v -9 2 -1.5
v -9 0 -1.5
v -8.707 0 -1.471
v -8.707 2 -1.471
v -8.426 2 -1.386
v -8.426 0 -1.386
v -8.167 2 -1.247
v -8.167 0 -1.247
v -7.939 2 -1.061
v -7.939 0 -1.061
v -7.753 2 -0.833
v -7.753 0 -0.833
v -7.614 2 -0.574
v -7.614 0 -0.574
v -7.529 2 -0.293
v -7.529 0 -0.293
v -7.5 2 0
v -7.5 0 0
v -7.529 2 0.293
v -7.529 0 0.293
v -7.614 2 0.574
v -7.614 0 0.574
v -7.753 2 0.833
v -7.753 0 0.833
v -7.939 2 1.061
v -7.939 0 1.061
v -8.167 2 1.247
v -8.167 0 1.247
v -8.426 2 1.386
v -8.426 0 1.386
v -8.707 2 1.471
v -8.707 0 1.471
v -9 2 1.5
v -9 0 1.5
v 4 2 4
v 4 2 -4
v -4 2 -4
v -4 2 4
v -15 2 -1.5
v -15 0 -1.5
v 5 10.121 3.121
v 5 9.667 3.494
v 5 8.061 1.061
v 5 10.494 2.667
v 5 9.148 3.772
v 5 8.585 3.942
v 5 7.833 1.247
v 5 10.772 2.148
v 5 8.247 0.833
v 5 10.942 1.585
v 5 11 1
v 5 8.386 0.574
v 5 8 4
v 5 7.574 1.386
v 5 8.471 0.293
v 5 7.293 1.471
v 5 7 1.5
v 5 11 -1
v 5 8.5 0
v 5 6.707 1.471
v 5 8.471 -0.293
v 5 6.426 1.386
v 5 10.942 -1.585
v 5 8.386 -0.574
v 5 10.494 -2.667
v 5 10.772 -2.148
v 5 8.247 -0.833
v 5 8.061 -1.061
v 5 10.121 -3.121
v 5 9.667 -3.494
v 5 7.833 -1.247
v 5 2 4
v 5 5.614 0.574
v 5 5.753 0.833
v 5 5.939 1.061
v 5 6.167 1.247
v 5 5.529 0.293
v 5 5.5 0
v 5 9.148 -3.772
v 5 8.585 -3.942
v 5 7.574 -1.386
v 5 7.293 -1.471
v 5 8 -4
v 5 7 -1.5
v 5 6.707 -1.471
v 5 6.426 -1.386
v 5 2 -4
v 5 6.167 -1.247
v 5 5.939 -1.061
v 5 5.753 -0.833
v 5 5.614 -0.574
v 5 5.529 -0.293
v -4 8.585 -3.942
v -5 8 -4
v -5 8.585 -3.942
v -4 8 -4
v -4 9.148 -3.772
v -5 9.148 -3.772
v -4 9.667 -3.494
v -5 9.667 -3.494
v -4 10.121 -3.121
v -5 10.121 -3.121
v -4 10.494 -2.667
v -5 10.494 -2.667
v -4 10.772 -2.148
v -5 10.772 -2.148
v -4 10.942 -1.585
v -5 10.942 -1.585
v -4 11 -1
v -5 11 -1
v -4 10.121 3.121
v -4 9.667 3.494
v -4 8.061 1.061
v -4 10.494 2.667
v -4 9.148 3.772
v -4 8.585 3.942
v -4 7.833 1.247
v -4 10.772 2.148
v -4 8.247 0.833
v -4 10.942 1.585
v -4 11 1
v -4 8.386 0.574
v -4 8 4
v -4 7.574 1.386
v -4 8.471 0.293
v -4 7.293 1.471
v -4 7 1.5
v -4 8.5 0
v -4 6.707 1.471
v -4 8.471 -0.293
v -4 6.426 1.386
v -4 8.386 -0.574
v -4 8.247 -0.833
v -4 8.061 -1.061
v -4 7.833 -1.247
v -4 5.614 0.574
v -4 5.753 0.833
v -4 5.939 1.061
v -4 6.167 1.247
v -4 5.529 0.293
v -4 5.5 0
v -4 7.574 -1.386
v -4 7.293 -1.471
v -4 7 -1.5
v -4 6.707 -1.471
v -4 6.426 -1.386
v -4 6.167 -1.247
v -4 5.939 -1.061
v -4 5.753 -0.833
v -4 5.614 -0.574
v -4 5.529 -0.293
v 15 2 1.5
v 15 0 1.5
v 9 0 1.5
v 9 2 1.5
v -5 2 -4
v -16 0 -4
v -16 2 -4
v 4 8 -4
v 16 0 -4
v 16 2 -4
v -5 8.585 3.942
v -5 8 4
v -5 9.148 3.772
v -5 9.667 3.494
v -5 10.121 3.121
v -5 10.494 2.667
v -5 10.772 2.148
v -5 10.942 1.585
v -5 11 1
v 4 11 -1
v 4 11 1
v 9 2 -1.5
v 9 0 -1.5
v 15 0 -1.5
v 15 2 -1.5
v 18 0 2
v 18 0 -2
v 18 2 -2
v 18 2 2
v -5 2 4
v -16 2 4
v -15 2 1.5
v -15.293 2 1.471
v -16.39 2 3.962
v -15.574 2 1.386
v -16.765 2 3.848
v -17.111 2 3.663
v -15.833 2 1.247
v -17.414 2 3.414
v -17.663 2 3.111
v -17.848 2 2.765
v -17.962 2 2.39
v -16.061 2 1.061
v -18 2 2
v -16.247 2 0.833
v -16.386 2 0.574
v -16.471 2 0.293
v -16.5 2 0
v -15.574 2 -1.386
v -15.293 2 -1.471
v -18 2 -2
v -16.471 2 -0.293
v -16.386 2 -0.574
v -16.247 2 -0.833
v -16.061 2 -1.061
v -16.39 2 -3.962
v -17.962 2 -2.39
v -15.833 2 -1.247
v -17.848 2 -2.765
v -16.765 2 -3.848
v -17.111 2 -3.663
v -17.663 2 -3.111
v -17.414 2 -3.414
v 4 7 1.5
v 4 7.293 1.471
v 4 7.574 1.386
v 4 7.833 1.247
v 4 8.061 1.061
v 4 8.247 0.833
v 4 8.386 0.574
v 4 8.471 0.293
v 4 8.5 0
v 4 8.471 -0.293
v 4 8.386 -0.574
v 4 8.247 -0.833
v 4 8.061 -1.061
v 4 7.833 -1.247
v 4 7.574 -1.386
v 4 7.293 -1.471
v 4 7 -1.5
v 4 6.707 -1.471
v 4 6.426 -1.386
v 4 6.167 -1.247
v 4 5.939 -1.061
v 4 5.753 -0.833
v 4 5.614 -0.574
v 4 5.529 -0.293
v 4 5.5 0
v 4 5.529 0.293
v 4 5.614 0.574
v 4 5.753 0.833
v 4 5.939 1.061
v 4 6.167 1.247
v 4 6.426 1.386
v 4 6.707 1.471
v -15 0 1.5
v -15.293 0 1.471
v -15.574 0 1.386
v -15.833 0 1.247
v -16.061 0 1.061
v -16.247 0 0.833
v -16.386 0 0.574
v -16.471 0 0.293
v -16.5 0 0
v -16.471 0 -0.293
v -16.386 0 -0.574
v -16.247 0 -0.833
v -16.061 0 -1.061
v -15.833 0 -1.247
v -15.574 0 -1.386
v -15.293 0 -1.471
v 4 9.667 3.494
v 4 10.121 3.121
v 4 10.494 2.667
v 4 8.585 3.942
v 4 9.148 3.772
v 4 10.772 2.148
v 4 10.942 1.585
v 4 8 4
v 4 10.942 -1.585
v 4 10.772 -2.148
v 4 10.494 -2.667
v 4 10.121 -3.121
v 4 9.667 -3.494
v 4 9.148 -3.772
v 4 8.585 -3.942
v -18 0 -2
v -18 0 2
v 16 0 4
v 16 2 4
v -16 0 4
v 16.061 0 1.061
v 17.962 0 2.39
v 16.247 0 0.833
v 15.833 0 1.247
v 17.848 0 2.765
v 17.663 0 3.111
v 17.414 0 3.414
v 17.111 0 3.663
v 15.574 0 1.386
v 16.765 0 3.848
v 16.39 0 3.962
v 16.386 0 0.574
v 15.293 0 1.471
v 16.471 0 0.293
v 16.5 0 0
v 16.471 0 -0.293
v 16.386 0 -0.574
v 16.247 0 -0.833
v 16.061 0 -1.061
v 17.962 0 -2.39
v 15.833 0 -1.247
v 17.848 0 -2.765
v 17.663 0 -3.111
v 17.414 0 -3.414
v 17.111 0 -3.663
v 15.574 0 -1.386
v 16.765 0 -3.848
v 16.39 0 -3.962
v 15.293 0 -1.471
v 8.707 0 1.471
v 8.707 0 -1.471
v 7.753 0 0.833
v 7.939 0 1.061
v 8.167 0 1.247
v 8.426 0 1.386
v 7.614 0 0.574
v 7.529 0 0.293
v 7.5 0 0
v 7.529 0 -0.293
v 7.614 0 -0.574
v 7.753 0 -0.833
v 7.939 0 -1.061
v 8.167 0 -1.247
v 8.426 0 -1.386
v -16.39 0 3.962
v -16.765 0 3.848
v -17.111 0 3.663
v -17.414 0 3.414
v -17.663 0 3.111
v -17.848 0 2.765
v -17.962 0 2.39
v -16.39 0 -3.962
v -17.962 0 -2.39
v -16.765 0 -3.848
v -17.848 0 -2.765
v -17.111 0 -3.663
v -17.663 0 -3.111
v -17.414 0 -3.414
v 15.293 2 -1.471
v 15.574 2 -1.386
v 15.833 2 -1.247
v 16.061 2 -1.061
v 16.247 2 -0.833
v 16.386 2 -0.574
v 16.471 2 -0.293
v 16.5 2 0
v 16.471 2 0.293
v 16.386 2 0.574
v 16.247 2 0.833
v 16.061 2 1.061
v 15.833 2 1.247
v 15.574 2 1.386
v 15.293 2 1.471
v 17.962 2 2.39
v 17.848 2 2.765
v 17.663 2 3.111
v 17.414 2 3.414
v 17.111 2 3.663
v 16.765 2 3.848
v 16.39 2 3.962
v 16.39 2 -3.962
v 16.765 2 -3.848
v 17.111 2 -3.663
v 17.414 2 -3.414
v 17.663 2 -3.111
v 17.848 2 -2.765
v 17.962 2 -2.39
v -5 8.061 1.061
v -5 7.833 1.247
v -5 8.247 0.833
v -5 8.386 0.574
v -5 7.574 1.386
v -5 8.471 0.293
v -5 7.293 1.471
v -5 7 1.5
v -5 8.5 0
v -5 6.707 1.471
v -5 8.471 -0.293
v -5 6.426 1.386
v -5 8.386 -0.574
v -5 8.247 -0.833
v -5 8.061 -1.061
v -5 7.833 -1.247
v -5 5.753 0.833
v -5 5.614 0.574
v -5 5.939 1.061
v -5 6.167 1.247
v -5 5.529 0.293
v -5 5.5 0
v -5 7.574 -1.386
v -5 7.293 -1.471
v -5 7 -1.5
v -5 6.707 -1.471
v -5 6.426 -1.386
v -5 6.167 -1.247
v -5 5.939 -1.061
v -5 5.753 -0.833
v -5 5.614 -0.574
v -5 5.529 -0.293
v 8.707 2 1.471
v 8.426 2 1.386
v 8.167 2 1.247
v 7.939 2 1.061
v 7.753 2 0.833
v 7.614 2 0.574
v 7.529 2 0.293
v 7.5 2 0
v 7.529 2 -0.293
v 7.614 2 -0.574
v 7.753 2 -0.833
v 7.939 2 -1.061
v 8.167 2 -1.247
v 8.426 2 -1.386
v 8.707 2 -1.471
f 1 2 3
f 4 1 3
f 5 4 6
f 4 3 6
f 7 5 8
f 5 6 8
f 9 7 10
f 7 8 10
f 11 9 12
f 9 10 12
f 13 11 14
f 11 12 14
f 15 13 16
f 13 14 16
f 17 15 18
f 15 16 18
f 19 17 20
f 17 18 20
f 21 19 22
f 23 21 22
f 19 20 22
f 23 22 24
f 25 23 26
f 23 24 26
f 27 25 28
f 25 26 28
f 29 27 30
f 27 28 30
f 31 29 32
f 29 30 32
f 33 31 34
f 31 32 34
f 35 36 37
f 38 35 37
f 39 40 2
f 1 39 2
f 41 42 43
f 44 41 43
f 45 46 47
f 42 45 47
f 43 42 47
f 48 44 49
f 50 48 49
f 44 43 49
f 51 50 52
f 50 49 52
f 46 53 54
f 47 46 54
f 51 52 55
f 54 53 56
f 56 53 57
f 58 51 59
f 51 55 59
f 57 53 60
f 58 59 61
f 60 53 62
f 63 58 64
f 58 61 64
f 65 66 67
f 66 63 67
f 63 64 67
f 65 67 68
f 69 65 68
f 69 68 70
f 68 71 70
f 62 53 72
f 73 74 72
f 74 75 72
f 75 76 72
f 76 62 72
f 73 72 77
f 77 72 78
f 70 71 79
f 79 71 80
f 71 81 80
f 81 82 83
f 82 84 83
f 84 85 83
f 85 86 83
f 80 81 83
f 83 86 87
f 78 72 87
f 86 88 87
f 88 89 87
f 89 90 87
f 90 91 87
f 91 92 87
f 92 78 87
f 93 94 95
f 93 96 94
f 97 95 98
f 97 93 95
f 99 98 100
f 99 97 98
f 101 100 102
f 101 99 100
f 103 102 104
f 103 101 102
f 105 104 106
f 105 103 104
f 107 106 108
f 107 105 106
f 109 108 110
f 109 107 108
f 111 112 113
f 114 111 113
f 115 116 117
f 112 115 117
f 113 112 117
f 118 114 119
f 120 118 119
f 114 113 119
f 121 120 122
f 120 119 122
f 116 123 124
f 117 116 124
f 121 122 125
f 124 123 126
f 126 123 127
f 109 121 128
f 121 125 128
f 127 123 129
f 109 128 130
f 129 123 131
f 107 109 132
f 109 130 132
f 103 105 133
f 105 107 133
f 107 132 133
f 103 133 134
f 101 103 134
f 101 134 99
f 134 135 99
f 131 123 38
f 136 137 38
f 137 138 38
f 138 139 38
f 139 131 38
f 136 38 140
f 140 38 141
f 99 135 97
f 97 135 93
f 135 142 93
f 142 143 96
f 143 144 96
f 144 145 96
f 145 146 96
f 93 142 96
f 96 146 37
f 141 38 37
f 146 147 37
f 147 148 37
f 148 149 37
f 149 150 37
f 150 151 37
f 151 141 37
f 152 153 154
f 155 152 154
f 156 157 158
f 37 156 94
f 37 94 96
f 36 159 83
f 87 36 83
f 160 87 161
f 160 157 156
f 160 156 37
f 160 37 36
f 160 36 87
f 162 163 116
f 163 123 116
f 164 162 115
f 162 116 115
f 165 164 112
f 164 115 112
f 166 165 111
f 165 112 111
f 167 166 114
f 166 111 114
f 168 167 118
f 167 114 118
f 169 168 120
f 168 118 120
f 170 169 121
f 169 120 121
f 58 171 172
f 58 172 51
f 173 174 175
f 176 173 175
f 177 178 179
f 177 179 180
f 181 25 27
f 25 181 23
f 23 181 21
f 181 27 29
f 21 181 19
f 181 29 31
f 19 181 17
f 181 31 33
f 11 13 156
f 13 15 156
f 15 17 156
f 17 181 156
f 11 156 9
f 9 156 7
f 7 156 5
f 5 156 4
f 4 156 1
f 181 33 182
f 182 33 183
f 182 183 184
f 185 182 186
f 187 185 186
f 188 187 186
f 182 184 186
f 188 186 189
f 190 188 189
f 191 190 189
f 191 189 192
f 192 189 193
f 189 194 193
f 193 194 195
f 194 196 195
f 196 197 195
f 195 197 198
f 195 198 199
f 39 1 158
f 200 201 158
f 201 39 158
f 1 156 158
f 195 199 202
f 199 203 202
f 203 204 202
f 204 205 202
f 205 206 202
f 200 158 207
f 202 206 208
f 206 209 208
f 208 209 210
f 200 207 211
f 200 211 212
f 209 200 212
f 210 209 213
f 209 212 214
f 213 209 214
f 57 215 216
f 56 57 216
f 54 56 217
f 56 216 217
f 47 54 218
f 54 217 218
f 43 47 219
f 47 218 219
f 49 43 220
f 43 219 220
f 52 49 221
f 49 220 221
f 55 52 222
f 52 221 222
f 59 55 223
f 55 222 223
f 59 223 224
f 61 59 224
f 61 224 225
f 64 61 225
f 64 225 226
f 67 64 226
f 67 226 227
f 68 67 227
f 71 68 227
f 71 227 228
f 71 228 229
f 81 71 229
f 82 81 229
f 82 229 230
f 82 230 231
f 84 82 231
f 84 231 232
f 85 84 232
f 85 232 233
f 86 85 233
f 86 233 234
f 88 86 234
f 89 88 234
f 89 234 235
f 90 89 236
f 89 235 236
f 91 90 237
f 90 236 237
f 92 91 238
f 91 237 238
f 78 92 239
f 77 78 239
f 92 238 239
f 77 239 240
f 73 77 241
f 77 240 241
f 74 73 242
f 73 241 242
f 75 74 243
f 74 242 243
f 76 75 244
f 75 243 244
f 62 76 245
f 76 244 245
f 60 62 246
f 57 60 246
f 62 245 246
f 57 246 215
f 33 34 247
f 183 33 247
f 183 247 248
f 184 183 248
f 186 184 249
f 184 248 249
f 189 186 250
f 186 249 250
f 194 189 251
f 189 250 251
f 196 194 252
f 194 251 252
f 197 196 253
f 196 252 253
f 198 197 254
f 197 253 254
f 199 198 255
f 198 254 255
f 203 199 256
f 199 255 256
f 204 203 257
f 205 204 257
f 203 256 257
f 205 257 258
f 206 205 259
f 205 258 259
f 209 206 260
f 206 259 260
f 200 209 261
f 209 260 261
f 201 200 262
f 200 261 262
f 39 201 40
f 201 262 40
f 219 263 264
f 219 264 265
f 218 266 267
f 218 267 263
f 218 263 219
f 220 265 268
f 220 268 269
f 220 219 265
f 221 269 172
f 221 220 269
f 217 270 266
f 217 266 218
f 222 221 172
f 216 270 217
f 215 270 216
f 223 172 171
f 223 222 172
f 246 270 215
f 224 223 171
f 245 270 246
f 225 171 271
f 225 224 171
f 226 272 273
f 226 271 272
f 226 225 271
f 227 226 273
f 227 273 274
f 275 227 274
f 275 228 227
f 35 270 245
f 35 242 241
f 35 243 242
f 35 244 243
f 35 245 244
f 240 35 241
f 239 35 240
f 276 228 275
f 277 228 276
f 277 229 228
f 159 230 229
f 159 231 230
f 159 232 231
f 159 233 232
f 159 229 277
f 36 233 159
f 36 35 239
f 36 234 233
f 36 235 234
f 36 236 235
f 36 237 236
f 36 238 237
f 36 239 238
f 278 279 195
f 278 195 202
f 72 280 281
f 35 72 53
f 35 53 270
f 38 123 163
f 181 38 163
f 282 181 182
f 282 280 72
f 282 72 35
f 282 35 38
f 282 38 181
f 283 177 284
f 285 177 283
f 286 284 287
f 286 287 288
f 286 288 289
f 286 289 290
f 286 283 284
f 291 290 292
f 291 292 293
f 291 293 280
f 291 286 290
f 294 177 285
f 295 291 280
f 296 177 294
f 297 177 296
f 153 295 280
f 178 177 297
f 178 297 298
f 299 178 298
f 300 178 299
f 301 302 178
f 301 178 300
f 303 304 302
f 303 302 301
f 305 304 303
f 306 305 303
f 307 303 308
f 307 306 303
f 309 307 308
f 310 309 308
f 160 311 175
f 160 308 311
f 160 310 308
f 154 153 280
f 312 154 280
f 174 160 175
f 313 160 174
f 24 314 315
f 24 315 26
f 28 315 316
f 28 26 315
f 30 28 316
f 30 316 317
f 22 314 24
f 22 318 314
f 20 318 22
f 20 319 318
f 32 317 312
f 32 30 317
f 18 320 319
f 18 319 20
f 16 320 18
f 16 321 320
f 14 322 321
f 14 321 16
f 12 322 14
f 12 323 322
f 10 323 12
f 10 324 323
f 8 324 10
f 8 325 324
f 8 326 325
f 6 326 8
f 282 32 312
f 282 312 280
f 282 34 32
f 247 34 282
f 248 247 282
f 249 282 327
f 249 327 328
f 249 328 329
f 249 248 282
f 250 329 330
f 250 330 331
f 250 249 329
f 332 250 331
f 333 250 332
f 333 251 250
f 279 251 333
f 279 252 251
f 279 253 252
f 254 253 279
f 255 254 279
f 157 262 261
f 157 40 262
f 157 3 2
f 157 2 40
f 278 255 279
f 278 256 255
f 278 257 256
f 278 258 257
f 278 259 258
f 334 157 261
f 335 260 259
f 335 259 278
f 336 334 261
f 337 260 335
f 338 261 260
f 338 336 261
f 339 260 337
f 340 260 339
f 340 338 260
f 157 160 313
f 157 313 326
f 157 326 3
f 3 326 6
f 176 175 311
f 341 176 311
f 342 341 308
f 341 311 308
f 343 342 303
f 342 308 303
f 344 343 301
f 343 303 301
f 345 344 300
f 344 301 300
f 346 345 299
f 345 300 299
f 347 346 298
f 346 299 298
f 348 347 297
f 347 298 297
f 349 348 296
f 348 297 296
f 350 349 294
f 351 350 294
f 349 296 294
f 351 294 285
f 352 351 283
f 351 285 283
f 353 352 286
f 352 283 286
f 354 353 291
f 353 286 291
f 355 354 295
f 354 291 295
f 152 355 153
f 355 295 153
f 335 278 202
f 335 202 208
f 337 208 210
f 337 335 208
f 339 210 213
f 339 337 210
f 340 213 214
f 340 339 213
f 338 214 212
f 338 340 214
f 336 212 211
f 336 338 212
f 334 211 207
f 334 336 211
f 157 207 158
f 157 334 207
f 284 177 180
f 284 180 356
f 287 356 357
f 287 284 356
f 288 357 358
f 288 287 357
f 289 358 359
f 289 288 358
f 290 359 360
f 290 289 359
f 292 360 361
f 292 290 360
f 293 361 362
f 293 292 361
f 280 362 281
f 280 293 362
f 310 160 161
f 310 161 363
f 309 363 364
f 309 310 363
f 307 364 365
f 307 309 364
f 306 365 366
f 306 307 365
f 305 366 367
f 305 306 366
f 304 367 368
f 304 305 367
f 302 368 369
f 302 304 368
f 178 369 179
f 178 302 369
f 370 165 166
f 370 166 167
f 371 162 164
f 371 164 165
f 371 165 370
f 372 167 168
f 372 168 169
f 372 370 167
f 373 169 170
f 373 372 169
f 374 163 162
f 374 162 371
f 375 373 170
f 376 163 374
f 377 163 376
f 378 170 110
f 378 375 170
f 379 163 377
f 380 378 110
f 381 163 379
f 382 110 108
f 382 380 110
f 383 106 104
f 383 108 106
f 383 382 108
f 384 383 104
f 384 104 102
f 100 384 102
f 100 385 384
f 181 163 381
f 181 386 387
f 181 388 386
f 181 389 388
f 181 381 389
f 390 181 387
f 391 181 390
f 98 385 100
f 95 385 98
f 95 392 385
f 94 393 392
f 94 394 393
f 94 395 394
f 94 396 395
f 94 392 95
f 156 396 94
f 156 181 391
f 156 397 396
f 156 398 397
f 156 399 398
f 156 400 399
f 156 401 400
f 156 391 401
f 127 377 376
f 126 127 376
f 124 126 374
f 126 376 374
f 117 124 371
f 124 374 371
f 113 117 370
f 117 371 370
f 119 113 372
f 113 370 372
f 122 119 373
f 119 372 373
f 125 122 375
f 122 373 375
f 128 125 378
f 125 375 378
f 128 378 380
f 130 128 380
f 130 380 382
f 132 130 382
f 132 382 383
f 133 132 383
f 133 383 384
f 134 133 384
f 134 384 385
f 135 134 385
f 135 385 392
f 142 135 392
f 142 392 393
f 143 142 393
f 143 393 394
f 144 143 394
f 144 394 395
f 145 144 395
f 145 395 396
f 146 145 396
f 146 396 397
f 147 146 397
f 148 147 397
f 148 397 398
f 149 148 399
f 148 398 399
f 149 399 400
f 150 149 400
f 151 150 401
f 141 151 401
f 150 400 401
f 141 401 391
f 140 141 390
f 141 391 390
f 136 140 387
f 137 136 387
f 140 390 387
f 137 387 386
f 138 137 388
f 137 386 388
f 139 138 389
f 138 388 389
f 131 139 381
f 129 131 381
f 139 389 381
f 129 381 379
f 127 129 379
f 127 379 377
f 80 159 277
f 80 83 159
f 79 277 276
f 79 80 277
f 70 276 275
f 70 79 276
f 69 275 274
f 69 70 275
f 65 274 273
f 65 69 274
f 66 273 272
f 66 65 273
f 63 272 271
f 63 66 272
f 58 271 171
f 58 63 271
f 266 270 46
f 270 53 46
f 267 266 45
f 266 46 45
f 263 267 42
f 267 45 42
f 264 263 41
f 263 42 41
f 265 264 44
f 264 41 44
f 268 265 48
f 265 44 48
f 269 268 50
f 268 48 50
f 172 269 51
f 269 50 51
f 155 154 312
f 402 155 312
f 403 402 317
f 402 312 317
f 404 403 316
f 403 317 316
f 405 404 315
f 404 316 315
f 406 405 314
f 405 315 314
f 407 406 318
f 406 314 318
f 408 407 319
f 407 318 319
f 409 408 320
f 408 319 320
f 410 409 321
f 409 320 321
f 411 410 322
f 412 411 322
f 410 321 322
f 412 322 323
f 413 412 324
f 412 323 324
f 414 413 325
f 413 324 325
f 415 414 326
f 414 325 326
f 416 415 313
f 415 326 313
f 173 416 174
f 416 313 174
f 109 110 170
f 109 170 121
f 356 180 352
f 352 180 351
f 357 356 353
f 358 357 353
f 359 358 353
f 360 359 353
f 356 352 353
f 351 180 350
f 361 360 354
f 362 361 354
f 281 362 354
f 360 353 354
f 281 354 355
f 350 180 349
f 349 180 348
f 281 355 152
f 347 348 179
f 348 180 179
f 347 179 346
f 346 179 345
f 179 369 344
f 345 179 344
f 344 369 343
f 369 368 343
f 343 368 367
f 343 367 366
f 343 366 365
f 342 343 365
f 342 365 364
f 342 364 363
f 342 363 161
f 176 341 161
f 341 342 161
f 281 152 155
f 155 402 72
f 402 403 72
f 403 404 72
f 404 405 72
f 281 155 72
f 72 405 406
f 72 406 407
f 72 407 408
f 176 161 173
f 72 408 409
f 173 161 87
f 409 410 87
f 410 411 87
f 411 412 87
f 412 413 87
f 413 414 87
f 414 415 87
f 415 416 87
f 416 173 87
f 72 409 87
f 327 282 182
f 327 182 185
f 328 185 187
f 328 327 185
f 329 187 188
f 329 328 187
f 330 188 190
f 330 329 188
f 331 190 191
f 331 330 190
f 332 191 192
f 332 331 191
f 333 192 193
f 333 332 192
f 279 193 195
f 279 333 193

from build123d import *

# Parameters (mm, degrees)
EXTRUDE_1_DEPTH     = 2
SKETCH_2_W          = 1
SKETCH_2_H          = 8
EXTRUDE_2_DEPTH     = 9
FILLET_2_R          = 3
SKETCH_3_R          = 1.5
CUT_EXTRUDE_1_DEPTH = 20


with BuildPart() as part:
    # 草图1 → 凸台-拉伸1 (new body)
    with BuildSketch(Plane(origin=(0, 0, 0), x_dir=(1, 0, 0), z_dir=(0, 1, 0))):
        with BuildLine():
            Line((-16, 4), (16, 4))
            ThreePointArc((16, 4), (17.414213562, 3.414213562), (18, 2))
            Line((18, 2), (18, -2))
            ThreePointArc((18, -2), (17.414213562, -3.414213562), (16, -4))
            Line((16, -4), (-16, -4))
            ThreePointArc((-16, -4), (-17.414213562, -3.414213562), (-18, -2))
            Line((-18, -2), (-18, 2))
            ThreePointArc((-18, 2), (-17.414213562, 3.414213562), (-16, 4))
        make_face()
        with BuildLine():
            Line((-9, -1.5), (-15, -1.5))
            ThreePointArc((-15, -1.5), (-16.5, 0), (-15, 1.5))
            Line((-15, 1.5), (-9, 1.5))
            ThreePointArc((-9, 1.5), (-7.5, 0), (-9, -1.5))
        make_face(mode=Mode.SUBTRACT)
        with BuildLine():
            Line((9, 1.5), (15, 1.5))
            ThreePointArc((15, 1.5), (16.5, 0), (15, -1.5))
            Line((15, -1.5), (9, -1.5))
            ThreePointArc((9, -1.5), (7.5, 0), (9, 1.5))
        make_face(mode=Mode.SUBTRACT)
    extrude(amount=EXTRUDE_1_DEPTH)

    # 草图2 → 凸台-拉伸2 (add)
    with BuildSketch(Plane(origin=(0, 2, 0), x_dir=(1, 0, 0), z_dir=(0, 1, 0))):
        with Locations((4.5, 0)):
            Rectangle(SKETCH_2_W, SKETCH_2_H)
        with Locations((-4.5, 0)):
            Rectangle(SKETCH_2_W, SKETCH_2_H)
    extrude(amount=EXTRUDE_2_DEPTH)

    # 圆角2
    fillet_2_edges = [part.edges().sort_by_distance(p)[0] for p in [
        (4.5, 11, -4),
        (4.5, 11, 4),
        (-4.5, 11, -4),
        (-4.5, 11, 4),
    ]]
    fillet(fillet_2_edges, radius=FILLET_2_R)

    # 草图3 → 切除-拉伸1 (cut)
    with BuildSketch(Plane.ZY.offset(5)):
        with Locations((0, 7)):
            Circle(SKETCH_3_R)
    extrude(amount=-CUT_EXTRUDE_1_DEPTH, mode=Mode.SUBTRACT)


solid = part.part
